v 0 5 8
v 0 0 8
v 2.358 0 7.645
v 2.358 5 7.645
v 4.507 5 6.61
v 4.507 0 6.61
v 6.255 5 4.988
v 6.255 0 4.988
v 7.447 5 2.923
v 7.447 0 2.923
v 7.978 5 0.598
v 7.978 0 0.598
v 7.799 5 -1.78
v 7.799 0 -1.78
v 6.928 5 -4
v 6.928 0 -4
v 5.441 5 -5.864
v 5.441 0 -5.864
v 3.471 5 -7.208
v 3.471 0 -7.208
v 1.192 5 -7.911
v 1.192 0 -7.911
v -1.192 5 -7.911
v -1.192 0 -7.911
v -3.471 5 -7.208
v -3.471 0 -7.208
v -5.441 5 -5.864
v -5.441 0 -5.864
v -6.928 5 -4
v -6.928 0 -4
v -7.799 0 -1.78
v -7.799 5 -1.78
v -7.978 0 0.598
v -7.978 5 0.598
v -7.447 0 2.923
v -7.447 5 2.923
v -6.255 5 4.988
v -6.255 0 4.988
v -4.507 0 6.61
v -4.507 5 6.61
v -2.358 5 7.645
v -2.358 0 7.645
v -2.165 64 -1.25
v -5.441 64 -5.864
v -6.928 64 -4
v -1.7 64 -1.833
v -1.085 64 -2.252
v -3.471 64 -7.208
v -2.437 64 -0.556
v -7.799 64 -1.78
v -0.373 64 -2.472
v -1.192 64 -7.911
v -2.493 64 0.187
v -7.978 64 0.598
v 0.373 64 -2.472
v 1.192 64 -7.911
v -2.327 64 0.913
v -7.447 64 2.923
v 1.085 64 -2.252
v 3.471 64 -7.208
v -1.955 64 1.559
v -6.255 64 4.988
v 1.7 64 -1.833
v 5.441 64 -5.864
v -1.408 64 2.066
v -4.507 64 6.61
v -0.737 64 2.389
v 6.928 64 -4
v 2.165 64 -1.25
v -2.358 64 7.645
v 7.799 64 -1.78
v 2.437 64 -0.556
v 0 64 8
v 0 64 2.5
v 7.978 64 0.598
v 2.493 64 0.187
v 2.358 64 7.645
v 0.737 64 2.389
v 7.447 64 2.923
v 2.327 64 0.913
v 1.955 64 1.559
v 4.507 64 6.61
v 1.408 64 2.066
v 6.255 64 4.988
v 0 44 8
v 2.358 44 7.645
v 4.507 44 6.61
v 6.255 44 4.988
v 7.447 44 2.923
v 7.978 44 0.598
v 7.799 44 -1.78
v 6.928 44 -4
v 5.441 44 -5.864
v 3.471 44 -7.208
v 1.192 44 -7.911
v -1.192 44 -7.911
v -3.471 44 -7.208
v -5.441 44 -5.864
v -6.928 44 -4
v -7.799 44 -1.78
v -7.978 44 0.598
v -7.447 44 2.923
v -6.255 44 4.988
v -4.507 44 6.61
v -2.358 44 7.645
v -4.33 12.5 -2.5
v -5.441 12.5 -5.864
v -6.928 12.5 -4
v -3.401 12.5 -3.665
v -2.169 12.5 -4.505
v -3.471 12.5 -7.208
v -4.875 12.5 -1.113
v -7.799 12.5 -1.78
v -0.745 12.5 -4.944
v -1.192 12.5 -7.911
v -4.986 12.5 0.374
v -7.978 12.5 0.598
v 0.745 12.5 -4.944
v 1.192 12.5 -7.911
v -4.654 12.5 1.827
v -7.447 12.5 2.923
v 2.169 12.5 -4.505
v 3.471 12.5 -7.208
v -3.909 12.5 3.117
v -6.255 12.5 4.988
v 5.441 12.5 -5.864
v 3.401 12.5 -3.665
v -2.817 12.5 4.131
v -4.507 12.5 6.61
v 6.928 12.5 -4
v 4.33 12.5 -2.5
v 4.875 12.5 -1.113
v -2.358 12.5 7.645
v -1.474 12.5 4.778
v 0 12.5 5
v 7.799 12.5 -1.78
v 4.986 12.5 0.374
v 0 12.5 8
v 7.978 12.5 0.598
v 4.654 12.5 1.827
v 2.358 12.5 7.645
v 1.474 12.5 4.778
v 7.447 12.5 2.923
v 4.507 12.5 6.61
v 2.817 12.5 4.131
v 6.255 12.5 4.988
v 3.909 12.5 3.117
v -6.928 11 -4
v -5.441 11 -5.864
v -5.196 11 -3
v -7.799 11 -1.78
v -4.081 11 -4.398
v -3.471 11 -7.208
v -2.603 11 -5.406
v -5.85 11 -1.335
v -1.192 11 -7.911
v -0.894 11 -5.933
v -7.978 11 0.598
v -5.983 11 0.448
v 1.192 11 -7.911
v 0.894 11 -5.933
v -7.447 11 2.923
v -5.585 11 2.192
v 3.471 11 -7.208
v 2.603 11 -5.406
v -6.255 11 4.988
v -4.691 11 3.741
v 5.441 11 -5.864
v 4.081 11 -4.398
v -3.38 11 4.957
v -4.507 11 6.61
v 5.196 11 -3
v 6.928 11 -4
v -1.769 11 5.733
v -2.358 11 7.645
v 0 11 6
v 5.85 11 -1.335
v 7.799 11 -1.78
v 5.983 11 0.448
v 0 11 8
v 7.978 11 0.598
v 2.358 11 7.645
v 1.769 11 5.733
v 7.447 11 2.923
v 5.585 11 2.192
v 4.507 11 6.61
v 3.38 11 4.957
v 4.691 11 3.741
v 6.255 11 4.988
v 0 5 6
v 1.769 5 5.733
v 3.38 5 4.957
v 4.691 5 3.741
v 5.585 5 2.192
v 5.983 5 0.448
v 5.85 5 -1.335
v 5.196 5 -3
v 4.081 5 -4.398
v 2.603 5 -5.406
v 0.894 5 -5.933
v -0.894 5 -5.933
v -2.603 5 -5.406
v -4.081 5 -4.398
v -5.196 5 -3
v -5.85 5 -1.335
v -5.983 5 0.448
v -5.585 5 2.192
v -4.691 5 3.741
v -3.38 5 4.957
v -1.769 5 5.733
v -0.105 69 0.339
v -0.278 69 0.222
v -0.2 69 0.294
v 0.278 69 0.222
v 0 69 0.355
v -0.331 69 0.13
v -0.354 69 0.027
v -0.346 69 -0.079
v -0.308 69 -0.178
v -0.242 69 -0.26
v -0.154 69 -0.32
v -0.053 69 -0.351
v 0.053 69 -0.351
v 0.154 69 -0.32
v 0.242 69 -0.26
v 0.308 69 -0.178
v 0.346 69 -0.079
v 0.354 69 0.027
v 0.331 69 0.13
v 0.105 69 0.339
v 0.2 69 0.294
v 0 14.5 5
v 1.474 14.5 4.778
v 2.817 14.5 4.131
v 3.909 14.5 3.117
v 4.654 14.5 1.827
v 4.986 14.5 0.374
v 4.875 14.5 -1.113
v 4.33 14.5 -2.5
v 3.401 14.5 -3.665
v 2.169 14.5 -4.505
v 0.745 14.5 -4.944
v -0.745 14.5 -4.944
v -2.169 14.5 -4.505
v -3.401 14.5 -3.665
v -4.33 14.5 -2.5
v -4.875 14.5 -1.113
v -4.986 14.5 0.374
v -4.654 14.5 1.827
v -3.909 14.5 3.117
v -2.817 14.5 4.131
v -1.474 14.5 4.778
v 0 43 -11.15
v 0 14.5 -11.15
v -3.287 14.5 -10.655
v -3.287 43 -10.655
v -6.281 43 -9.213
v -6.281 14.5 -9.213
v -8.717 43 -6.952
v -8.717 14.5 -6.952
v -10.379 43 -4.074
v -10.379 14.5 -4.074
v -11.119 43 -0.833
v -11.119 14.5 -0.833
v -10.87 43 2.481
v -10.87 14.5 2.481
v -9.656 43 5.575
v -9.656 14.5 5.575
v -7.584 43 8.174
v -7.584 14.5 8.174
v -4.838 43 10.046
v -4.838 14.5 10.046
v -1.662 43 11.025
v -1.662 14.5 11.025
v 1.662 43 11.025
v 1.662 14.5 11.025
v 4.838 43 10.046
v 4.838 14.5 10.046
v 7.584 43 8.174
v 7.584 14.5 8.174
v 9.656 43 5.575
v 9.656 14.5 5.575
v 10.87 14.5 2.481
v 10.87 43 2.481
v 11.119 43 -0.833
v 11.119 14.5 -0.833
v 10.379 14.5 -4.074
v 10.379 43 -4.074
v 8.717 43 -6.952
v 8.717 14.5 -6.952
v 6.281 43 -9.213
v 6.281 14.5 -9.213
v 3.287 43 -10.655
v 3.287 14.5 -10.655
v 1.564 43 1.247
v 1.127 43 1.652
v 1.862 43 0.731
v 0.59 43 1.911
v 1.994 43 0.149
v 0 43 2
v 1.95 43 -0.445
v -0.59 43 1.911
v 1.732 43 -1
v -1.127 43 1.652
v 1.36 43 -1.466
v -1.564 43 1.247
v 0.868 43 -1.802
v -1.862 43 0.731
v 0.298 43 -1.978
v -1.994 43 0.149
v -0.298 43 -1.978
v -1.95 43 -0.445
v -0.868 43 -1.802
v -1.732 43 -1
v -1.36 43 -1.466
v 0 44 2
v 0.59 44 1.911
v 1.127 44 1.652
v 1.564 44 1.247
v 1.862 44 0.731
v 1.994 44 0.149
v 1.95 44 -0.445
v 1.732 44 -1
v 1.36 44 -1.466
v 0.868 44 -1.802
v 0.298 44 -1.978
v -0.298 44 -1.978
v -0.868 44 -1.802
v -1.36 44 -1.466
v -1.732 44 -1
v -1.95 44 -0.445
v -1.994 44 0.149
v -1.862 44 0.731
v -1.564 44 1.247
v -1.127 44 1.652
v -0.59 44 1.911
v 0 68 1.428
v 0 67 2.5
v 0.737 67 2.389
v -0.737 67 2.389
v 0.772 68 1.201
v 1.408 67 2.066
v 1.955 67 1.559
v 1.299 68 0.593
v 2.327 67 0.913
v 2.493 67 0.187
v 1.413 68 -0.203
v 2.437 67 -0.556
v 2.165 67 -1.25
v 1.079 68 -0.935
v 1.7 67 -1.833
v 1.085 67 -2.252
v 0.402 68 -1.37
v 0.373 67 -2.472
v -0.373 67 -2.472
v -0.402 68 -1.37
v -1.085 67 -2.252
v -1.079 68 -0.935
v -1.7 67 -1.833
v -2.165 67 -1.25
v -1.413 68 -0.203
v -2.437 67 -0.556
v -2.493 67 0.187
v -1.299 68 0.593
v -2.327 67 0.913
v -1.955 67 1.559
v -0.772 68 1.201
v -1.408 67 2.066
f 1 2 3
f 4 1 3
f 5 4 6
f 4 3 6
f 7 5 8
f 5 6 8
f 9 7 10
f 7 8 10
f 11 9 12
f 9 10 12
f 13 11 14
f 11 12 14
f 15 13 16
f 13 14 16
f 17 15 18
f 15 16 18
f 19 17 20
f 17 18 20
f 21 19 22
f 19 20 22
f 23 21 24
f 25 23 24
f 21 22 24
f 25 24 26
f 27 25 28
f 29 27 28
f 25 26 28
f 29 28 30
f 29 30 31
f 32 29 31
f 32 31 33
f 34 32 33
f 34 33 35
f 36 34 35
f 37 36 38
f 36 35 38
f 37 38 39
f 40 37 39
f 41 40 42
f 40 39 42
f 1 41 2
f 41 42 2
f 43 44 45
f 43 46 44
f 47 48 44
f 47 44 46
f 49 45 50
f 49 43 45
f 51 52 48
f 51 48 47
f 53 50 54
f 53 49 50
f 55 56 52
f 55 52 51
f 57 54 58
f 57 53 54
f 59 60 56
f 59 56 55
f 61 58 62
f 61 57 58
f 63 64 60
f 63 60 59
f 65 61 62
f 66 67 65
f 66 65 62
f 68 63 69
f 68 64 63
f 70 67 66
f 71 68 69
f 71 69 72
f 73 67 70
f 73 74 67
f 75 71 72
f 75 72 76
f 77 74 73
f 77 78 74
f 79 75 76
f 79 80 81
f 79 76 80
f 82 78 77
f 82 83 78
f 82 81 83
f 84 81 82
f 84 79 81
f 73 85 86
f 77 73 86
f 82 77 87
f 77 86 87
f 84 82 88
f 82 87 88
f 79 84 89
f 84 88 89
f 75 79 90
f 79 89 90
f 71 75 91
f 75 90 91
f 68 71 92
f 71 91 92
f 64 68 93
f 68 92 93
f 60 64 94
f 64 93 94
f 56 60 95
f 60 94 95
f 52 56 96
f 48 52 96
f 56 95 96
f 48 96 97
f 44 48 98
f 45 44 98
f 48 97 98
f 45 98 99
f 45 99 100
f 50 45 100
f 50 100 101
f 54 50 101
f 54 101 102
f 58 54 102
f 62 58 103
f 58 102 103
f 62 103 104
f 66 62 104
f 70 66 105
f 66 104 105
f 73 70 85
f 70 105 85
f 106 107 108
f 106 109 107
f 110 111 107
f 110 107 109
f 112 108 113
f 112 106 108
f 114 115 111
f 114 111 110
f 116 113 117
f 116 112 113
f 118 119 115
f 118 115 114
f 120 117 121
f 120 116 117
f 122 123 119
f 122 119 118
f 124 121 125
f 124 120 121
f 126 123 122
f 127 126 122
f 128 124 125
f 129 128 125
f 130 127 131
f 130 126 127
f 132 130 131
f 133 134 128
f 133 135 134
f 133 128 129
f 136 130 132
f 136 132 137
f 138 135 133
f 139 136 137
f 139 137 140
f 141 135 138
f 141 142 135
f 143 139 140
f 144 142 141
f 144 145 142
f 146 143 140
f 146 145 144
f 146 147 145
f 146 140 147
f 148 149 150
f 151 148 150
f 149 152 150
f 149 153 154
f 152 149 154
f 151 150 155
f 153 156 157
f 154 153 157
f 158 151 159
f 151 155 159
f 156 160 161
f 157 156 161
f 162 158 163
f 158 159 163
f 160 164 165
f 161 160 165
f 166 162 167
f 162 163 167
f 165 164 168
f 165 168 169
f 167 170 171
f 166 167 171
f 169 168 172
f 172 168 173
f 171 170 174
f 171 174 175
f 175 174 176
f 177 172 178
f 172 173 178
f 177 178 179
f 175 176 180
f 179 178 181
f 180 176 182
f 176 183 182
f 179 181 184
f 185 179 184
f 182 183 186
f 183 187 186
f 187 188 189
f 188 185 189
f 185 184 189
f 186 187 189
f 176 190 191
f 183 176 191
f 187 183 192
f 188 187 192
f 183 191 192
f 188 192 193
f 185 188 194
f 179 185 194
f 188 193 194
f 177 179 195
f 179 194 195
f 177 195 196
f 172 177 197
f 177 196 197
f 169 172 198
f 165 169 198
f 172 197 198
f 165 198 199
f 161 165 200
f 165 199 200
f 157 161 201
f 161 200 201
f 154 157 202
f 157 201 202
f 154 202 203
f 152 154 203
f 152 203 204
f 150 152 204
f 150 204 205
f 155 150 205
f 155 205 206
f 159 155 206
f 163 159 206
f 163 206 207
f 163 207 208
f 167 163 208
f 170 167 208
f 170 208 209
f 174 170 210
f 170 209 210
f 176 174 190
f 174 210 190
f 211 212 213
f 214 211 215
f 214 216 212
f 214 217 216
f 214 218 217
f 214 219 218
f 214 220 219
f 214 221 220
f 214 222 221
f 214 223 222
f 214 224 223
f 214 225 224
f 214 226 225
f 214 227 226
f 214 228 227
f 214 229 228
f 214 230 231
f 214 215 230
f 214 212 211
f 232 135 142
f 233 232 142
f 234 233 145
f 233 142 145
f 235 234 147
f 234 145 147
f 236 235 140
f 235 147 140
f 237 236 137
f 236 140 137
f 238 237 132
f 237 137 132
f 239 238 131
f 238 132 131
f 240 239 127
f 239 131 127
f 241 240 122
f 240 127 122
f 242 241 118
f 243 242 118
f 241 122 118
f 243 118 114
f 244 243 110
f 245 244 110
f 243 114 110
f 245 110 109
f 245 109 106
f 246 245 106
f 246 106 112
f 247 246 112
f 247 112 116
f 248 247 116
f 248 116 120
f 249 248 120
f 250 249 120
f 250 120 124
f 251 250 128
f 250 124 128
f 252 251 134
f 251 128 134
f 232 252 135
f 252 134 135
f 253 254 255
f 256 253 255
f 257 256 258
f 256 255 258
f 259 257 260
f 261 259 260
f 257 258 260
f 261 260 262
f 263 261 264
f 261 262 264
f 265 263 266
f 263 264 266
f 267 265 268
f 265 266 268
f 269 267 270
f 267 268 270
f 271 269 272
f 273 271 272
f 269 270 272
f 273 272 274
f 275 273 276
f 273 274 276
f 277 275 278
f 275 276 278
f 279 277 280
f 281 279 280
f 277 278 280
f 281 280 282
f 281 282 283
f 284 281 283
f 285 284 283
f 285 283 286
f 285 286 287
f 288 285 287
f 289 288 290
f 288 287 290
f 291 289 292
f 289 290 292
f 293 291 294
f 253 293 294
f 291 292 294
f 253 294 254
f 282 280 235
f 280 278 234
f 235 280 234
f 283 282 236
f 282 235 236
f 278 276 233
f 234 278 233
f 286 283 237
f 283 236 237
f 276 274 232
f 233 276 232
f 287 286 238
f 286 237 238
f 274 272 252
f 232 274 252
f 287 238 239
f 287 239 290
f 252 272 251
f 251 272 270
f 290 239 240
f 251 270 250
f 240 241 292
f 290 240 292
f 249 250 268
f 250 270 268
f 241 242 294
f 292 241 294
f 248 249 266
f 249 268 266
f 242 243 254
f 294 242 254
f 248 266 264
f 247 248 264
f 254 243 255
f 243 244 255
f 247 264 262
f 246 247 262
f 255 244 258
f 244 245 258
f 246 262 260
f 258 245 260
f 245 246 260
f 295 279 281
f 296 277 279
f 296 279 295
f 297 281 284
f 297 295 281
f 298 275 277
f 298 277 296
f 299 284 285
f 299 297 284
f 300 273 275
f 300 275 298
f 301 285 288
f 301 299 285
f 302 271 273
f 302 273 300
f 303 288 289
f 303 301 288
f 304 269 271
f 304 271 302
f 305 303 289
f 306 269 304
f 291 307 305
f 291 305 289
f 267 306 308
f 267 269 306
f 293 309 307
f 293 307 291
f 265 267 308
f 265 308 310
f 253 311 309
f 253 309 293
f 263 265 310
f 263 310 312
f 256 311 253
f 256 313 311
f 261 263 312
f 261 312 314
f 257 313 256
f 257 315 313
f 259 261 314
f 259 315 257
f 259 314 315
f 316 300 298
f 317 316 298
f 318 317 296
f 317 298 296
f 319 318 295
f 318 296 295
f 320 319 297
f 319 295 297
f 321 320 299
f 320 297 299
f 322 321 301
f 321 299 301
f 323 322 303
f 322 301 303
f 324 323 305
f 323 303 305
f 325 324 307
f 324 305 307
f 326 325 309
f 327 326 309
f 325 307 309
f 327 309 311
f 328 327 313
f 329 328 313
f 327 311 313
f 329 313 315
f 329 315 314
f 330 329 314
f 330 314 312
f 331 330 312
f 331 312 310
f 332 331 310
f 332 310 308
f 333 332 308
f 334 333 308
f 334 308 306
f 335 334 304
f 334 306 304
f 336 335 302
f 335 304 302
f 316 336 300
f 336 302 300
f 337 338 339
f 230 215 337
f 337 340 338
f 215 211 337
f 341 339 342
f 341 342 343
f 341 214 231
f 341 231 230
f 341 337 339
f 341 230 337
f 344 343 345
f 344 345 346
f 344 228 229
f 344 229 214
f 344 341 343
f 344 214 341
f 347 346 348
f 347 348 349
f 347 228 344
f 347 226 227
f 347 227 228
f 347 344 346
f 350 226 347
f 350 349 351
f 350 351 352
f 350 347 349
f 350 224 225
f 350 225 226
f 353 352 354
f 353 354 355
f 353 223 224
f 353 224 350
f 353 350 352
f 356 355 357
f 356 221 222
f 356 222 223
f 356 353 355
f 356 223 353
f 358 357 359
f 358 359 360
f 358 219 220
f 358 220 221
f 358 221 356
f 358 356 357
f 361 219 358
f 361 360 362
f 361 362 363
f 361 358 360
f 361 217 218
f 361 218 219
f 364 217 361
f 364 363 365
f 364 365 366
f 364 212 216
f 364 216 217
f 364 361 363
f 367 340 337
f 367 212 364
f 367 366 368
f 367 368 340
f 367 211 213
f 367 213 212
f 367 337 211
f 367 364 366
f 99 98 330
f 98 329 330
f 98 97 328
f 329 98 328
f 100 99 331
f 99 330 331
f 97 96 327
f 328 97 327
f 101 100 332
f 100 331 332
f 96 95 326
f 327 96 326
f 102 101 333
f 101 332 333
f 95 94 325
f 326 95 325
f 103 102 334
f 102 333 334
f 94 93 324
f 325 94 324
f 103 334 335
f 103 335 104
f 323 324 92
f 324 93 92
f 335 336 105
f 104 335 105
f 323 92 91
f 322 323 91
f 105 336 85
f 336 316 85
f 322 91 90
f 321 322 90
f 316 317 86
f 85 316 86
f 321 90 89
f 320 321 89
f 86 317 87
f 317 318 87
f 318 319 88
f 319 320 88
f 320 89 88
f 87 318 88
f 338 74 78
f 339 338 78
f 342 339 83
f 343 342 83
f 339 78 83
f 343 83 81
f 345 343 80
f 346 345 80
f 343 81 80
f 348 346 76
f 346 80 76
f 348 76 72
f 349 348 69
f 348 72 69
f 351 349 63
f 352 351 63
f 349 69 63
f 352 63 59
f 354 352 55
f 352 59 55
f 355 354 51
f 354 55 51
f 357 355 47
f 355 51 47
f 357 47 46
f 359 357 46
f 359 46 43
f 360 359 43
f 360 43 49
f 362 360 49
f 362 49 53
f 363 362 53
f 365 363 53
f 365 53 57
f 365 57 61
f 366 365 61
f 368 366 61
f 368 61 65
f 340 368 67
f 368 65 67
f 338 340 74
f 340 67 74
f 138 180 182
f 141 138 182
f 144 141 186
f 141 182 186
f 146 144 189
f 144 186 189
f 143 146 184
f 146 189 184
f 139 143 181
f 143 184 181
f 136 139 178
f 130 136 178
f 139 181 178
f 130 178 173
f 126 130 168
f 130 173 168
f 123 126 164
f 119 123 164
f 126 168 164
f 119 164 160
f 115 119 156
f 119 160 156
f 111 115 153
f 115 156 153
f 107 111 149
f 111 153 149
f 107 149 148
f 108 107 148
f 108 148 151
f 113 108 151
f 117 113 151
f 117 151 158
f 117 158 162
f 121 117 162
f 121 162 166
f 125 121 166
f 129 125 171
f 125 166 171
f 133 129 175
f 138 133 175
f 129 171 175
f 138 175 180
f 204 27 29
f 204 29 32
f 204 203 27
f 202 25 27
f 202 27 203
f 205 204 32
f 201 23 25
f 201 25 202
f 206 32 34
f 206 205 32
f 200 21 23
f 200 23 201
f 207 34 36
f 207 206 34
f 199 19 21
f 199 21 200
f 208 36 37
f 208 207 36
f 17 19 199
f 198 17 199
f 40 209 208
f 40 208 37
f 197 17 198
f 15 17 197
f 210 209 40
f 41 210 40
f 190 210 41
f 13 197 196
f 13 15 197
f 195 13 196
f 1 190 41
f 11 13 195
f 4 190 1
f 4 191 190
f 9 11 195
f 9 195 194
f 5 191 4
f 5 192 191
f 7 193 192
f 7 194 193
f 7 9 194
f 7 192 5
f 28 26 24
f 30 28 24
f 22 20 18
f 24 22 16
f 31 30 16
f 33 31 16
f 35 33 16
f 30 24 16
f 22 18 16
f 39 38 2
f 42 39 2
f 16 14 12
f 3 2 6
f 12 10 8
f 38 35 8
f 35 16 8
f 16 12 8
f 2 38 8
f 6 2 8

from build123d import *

# Parameters (mm, degrees)
SKETCH1_R           = 8
BOSS_EXTRUDE1_DEPTH = 5
SKETCH2_R           = 6
BOSS_EXTRUDE2_DEPTH = 6
SKETCH3_R           = 8
BOSS_EXTRUDE3_DEPTH = 1.5
SKETCH4_R           = 5
BOSS_EXTRUDE4_DEPTH = 2
SKETCH5_R           = 11.15
BOSS_EXTRUDE5_DEPTH = 28.5
SKETCH6_R           = 2
BOSS_EXTRUDE6_DEPTH = 1
SKETCH7_R           = 8
BOSS_EXTRUDE7_DEPTH = 20
SKETCH8_R           = 2.5
BOSS_EXTRUDE8_DEPTH = 3
SKETCH9_R           = 2.5
BOSS_EXTRUDE9_DEPTH = 2
BOSS_EXTRUDE9_TAPER = 47


with BuildPart() as part:
    # Sketch1 → Boss-Extrude1 (new body)
    with BuildSketch(Plane(origin=(0, 0, 0), x_dir=(1, 0, 0), z_dir=(0, 1, 0))):
        with Locations(Location((0, 0, 0), (0, 0, 270))):
            Circle(SKETCH1_R)
    extrude(amount=BOSS_EXTRUDE1_DEPTH)

    # Sketch2 → Boss-Extrude2 (add)
    with BuildSketch(Plane(origin=(0, 5, 0), x_dir=(1, 0, 0), z_dir=(0, 1, 0))):
        with Locations(Location((0, 0, 0), (0, 0, 270))):
            Circle(SKETCH2_R)
    extrude(amount=BOSS_EXTRUDE2_DEPTH)

    # Sketch3 → Boss-Extrude3 (add)
    with BuildSketch(Plane(origin=(0, 11, 0), x_dir=(1, 0, 0), z_dir=(0, 1, 0))):
        with Locations(Location((0, 0, 0), (0, 0, 270))):
            Circle(SKETCH3_R)
    extrude(amount=BOSS_EXTRUDE3_DEPTH)

    # Sketch4 → Boss-Extrude4 (add)
    with BuildSketch(Plane(origin=(0, 12.5, 0), x_dir=(1, 0, 0), z_dir=(0, 1, 0))):
        with Locations(Location((0, 0, 0), (0, 0, 270))):
            Circle(SKETCH4_R)
    extrude(amount=BOSS_EXTRUDE4_DEPTH)

    # Sketch5 → Boss-Extrude5 (add)
    with BuildSketch(Plane(origin=(0, 14.5, 0), x_dir=(1, 0, 0), z_dir=(0, 1, 0))):
        with Locations(Location((0, 0, 0), (0, 0, 90))):
            Circle(SKETCH5_R)
    extrude(amount=BOSS_EXTRUDE5_DEPTH)

    # Sketch6 → Boss-Extrude6 (add)
    with BuildSketch(Plane(origin=(0, 43, 0), x_dir=(1, 0, 0), z_dir=(0, 1, 0))):
        with Locations(Location((0, 0, 0), (0, 0, 270))):
            Circle(SKETCH6_R)
    extrude(amount=BOSS_EXTRUDE6_DEPTH)

    # Sketch7 → Boss-Extrude7 (add)
    with BuildSketch(Plane(origin=(0, 44, 0), x_dir=(1, 0, 0), z_dir=(0, 1, 0))):
        with Locations(Location((0, 0, 0), (0, 0, 270))):
            Circle(SKETCH7_R)
    extrude(amount=BOSS_EXTRUDE7_DEPTH)

    # Sketch8 → Boss-Extrude8 (add)
    with BuildSketch(Plane(origin=(0, 64, 0), x_dir=(1, 0, 0), z_dir=(0, 1, 0))):
        with Locations(Location((0, 0, 0), (0, 0, 270))):
            Circle(SKETCH8_R)
    extrude(amount=BOSS_EXTRUDE8_DEPTH)

    # Sketch9 → Boss-Extrude9 (add)
    with BuildSketch(Plane(origin=(0, 67, 0), x_dir=(1, 0, 0), z_dir=(0, 1, 0))):
        with Locations(Location((0, 0, 0), (0, 0, 270))):
            Circle(SKETCH9_R)
    extrude(amount=BOSS_EXTRUDE9_DEPTH, taper=BOSS_EXTRUDE9_TAPER)


solid = part.part
